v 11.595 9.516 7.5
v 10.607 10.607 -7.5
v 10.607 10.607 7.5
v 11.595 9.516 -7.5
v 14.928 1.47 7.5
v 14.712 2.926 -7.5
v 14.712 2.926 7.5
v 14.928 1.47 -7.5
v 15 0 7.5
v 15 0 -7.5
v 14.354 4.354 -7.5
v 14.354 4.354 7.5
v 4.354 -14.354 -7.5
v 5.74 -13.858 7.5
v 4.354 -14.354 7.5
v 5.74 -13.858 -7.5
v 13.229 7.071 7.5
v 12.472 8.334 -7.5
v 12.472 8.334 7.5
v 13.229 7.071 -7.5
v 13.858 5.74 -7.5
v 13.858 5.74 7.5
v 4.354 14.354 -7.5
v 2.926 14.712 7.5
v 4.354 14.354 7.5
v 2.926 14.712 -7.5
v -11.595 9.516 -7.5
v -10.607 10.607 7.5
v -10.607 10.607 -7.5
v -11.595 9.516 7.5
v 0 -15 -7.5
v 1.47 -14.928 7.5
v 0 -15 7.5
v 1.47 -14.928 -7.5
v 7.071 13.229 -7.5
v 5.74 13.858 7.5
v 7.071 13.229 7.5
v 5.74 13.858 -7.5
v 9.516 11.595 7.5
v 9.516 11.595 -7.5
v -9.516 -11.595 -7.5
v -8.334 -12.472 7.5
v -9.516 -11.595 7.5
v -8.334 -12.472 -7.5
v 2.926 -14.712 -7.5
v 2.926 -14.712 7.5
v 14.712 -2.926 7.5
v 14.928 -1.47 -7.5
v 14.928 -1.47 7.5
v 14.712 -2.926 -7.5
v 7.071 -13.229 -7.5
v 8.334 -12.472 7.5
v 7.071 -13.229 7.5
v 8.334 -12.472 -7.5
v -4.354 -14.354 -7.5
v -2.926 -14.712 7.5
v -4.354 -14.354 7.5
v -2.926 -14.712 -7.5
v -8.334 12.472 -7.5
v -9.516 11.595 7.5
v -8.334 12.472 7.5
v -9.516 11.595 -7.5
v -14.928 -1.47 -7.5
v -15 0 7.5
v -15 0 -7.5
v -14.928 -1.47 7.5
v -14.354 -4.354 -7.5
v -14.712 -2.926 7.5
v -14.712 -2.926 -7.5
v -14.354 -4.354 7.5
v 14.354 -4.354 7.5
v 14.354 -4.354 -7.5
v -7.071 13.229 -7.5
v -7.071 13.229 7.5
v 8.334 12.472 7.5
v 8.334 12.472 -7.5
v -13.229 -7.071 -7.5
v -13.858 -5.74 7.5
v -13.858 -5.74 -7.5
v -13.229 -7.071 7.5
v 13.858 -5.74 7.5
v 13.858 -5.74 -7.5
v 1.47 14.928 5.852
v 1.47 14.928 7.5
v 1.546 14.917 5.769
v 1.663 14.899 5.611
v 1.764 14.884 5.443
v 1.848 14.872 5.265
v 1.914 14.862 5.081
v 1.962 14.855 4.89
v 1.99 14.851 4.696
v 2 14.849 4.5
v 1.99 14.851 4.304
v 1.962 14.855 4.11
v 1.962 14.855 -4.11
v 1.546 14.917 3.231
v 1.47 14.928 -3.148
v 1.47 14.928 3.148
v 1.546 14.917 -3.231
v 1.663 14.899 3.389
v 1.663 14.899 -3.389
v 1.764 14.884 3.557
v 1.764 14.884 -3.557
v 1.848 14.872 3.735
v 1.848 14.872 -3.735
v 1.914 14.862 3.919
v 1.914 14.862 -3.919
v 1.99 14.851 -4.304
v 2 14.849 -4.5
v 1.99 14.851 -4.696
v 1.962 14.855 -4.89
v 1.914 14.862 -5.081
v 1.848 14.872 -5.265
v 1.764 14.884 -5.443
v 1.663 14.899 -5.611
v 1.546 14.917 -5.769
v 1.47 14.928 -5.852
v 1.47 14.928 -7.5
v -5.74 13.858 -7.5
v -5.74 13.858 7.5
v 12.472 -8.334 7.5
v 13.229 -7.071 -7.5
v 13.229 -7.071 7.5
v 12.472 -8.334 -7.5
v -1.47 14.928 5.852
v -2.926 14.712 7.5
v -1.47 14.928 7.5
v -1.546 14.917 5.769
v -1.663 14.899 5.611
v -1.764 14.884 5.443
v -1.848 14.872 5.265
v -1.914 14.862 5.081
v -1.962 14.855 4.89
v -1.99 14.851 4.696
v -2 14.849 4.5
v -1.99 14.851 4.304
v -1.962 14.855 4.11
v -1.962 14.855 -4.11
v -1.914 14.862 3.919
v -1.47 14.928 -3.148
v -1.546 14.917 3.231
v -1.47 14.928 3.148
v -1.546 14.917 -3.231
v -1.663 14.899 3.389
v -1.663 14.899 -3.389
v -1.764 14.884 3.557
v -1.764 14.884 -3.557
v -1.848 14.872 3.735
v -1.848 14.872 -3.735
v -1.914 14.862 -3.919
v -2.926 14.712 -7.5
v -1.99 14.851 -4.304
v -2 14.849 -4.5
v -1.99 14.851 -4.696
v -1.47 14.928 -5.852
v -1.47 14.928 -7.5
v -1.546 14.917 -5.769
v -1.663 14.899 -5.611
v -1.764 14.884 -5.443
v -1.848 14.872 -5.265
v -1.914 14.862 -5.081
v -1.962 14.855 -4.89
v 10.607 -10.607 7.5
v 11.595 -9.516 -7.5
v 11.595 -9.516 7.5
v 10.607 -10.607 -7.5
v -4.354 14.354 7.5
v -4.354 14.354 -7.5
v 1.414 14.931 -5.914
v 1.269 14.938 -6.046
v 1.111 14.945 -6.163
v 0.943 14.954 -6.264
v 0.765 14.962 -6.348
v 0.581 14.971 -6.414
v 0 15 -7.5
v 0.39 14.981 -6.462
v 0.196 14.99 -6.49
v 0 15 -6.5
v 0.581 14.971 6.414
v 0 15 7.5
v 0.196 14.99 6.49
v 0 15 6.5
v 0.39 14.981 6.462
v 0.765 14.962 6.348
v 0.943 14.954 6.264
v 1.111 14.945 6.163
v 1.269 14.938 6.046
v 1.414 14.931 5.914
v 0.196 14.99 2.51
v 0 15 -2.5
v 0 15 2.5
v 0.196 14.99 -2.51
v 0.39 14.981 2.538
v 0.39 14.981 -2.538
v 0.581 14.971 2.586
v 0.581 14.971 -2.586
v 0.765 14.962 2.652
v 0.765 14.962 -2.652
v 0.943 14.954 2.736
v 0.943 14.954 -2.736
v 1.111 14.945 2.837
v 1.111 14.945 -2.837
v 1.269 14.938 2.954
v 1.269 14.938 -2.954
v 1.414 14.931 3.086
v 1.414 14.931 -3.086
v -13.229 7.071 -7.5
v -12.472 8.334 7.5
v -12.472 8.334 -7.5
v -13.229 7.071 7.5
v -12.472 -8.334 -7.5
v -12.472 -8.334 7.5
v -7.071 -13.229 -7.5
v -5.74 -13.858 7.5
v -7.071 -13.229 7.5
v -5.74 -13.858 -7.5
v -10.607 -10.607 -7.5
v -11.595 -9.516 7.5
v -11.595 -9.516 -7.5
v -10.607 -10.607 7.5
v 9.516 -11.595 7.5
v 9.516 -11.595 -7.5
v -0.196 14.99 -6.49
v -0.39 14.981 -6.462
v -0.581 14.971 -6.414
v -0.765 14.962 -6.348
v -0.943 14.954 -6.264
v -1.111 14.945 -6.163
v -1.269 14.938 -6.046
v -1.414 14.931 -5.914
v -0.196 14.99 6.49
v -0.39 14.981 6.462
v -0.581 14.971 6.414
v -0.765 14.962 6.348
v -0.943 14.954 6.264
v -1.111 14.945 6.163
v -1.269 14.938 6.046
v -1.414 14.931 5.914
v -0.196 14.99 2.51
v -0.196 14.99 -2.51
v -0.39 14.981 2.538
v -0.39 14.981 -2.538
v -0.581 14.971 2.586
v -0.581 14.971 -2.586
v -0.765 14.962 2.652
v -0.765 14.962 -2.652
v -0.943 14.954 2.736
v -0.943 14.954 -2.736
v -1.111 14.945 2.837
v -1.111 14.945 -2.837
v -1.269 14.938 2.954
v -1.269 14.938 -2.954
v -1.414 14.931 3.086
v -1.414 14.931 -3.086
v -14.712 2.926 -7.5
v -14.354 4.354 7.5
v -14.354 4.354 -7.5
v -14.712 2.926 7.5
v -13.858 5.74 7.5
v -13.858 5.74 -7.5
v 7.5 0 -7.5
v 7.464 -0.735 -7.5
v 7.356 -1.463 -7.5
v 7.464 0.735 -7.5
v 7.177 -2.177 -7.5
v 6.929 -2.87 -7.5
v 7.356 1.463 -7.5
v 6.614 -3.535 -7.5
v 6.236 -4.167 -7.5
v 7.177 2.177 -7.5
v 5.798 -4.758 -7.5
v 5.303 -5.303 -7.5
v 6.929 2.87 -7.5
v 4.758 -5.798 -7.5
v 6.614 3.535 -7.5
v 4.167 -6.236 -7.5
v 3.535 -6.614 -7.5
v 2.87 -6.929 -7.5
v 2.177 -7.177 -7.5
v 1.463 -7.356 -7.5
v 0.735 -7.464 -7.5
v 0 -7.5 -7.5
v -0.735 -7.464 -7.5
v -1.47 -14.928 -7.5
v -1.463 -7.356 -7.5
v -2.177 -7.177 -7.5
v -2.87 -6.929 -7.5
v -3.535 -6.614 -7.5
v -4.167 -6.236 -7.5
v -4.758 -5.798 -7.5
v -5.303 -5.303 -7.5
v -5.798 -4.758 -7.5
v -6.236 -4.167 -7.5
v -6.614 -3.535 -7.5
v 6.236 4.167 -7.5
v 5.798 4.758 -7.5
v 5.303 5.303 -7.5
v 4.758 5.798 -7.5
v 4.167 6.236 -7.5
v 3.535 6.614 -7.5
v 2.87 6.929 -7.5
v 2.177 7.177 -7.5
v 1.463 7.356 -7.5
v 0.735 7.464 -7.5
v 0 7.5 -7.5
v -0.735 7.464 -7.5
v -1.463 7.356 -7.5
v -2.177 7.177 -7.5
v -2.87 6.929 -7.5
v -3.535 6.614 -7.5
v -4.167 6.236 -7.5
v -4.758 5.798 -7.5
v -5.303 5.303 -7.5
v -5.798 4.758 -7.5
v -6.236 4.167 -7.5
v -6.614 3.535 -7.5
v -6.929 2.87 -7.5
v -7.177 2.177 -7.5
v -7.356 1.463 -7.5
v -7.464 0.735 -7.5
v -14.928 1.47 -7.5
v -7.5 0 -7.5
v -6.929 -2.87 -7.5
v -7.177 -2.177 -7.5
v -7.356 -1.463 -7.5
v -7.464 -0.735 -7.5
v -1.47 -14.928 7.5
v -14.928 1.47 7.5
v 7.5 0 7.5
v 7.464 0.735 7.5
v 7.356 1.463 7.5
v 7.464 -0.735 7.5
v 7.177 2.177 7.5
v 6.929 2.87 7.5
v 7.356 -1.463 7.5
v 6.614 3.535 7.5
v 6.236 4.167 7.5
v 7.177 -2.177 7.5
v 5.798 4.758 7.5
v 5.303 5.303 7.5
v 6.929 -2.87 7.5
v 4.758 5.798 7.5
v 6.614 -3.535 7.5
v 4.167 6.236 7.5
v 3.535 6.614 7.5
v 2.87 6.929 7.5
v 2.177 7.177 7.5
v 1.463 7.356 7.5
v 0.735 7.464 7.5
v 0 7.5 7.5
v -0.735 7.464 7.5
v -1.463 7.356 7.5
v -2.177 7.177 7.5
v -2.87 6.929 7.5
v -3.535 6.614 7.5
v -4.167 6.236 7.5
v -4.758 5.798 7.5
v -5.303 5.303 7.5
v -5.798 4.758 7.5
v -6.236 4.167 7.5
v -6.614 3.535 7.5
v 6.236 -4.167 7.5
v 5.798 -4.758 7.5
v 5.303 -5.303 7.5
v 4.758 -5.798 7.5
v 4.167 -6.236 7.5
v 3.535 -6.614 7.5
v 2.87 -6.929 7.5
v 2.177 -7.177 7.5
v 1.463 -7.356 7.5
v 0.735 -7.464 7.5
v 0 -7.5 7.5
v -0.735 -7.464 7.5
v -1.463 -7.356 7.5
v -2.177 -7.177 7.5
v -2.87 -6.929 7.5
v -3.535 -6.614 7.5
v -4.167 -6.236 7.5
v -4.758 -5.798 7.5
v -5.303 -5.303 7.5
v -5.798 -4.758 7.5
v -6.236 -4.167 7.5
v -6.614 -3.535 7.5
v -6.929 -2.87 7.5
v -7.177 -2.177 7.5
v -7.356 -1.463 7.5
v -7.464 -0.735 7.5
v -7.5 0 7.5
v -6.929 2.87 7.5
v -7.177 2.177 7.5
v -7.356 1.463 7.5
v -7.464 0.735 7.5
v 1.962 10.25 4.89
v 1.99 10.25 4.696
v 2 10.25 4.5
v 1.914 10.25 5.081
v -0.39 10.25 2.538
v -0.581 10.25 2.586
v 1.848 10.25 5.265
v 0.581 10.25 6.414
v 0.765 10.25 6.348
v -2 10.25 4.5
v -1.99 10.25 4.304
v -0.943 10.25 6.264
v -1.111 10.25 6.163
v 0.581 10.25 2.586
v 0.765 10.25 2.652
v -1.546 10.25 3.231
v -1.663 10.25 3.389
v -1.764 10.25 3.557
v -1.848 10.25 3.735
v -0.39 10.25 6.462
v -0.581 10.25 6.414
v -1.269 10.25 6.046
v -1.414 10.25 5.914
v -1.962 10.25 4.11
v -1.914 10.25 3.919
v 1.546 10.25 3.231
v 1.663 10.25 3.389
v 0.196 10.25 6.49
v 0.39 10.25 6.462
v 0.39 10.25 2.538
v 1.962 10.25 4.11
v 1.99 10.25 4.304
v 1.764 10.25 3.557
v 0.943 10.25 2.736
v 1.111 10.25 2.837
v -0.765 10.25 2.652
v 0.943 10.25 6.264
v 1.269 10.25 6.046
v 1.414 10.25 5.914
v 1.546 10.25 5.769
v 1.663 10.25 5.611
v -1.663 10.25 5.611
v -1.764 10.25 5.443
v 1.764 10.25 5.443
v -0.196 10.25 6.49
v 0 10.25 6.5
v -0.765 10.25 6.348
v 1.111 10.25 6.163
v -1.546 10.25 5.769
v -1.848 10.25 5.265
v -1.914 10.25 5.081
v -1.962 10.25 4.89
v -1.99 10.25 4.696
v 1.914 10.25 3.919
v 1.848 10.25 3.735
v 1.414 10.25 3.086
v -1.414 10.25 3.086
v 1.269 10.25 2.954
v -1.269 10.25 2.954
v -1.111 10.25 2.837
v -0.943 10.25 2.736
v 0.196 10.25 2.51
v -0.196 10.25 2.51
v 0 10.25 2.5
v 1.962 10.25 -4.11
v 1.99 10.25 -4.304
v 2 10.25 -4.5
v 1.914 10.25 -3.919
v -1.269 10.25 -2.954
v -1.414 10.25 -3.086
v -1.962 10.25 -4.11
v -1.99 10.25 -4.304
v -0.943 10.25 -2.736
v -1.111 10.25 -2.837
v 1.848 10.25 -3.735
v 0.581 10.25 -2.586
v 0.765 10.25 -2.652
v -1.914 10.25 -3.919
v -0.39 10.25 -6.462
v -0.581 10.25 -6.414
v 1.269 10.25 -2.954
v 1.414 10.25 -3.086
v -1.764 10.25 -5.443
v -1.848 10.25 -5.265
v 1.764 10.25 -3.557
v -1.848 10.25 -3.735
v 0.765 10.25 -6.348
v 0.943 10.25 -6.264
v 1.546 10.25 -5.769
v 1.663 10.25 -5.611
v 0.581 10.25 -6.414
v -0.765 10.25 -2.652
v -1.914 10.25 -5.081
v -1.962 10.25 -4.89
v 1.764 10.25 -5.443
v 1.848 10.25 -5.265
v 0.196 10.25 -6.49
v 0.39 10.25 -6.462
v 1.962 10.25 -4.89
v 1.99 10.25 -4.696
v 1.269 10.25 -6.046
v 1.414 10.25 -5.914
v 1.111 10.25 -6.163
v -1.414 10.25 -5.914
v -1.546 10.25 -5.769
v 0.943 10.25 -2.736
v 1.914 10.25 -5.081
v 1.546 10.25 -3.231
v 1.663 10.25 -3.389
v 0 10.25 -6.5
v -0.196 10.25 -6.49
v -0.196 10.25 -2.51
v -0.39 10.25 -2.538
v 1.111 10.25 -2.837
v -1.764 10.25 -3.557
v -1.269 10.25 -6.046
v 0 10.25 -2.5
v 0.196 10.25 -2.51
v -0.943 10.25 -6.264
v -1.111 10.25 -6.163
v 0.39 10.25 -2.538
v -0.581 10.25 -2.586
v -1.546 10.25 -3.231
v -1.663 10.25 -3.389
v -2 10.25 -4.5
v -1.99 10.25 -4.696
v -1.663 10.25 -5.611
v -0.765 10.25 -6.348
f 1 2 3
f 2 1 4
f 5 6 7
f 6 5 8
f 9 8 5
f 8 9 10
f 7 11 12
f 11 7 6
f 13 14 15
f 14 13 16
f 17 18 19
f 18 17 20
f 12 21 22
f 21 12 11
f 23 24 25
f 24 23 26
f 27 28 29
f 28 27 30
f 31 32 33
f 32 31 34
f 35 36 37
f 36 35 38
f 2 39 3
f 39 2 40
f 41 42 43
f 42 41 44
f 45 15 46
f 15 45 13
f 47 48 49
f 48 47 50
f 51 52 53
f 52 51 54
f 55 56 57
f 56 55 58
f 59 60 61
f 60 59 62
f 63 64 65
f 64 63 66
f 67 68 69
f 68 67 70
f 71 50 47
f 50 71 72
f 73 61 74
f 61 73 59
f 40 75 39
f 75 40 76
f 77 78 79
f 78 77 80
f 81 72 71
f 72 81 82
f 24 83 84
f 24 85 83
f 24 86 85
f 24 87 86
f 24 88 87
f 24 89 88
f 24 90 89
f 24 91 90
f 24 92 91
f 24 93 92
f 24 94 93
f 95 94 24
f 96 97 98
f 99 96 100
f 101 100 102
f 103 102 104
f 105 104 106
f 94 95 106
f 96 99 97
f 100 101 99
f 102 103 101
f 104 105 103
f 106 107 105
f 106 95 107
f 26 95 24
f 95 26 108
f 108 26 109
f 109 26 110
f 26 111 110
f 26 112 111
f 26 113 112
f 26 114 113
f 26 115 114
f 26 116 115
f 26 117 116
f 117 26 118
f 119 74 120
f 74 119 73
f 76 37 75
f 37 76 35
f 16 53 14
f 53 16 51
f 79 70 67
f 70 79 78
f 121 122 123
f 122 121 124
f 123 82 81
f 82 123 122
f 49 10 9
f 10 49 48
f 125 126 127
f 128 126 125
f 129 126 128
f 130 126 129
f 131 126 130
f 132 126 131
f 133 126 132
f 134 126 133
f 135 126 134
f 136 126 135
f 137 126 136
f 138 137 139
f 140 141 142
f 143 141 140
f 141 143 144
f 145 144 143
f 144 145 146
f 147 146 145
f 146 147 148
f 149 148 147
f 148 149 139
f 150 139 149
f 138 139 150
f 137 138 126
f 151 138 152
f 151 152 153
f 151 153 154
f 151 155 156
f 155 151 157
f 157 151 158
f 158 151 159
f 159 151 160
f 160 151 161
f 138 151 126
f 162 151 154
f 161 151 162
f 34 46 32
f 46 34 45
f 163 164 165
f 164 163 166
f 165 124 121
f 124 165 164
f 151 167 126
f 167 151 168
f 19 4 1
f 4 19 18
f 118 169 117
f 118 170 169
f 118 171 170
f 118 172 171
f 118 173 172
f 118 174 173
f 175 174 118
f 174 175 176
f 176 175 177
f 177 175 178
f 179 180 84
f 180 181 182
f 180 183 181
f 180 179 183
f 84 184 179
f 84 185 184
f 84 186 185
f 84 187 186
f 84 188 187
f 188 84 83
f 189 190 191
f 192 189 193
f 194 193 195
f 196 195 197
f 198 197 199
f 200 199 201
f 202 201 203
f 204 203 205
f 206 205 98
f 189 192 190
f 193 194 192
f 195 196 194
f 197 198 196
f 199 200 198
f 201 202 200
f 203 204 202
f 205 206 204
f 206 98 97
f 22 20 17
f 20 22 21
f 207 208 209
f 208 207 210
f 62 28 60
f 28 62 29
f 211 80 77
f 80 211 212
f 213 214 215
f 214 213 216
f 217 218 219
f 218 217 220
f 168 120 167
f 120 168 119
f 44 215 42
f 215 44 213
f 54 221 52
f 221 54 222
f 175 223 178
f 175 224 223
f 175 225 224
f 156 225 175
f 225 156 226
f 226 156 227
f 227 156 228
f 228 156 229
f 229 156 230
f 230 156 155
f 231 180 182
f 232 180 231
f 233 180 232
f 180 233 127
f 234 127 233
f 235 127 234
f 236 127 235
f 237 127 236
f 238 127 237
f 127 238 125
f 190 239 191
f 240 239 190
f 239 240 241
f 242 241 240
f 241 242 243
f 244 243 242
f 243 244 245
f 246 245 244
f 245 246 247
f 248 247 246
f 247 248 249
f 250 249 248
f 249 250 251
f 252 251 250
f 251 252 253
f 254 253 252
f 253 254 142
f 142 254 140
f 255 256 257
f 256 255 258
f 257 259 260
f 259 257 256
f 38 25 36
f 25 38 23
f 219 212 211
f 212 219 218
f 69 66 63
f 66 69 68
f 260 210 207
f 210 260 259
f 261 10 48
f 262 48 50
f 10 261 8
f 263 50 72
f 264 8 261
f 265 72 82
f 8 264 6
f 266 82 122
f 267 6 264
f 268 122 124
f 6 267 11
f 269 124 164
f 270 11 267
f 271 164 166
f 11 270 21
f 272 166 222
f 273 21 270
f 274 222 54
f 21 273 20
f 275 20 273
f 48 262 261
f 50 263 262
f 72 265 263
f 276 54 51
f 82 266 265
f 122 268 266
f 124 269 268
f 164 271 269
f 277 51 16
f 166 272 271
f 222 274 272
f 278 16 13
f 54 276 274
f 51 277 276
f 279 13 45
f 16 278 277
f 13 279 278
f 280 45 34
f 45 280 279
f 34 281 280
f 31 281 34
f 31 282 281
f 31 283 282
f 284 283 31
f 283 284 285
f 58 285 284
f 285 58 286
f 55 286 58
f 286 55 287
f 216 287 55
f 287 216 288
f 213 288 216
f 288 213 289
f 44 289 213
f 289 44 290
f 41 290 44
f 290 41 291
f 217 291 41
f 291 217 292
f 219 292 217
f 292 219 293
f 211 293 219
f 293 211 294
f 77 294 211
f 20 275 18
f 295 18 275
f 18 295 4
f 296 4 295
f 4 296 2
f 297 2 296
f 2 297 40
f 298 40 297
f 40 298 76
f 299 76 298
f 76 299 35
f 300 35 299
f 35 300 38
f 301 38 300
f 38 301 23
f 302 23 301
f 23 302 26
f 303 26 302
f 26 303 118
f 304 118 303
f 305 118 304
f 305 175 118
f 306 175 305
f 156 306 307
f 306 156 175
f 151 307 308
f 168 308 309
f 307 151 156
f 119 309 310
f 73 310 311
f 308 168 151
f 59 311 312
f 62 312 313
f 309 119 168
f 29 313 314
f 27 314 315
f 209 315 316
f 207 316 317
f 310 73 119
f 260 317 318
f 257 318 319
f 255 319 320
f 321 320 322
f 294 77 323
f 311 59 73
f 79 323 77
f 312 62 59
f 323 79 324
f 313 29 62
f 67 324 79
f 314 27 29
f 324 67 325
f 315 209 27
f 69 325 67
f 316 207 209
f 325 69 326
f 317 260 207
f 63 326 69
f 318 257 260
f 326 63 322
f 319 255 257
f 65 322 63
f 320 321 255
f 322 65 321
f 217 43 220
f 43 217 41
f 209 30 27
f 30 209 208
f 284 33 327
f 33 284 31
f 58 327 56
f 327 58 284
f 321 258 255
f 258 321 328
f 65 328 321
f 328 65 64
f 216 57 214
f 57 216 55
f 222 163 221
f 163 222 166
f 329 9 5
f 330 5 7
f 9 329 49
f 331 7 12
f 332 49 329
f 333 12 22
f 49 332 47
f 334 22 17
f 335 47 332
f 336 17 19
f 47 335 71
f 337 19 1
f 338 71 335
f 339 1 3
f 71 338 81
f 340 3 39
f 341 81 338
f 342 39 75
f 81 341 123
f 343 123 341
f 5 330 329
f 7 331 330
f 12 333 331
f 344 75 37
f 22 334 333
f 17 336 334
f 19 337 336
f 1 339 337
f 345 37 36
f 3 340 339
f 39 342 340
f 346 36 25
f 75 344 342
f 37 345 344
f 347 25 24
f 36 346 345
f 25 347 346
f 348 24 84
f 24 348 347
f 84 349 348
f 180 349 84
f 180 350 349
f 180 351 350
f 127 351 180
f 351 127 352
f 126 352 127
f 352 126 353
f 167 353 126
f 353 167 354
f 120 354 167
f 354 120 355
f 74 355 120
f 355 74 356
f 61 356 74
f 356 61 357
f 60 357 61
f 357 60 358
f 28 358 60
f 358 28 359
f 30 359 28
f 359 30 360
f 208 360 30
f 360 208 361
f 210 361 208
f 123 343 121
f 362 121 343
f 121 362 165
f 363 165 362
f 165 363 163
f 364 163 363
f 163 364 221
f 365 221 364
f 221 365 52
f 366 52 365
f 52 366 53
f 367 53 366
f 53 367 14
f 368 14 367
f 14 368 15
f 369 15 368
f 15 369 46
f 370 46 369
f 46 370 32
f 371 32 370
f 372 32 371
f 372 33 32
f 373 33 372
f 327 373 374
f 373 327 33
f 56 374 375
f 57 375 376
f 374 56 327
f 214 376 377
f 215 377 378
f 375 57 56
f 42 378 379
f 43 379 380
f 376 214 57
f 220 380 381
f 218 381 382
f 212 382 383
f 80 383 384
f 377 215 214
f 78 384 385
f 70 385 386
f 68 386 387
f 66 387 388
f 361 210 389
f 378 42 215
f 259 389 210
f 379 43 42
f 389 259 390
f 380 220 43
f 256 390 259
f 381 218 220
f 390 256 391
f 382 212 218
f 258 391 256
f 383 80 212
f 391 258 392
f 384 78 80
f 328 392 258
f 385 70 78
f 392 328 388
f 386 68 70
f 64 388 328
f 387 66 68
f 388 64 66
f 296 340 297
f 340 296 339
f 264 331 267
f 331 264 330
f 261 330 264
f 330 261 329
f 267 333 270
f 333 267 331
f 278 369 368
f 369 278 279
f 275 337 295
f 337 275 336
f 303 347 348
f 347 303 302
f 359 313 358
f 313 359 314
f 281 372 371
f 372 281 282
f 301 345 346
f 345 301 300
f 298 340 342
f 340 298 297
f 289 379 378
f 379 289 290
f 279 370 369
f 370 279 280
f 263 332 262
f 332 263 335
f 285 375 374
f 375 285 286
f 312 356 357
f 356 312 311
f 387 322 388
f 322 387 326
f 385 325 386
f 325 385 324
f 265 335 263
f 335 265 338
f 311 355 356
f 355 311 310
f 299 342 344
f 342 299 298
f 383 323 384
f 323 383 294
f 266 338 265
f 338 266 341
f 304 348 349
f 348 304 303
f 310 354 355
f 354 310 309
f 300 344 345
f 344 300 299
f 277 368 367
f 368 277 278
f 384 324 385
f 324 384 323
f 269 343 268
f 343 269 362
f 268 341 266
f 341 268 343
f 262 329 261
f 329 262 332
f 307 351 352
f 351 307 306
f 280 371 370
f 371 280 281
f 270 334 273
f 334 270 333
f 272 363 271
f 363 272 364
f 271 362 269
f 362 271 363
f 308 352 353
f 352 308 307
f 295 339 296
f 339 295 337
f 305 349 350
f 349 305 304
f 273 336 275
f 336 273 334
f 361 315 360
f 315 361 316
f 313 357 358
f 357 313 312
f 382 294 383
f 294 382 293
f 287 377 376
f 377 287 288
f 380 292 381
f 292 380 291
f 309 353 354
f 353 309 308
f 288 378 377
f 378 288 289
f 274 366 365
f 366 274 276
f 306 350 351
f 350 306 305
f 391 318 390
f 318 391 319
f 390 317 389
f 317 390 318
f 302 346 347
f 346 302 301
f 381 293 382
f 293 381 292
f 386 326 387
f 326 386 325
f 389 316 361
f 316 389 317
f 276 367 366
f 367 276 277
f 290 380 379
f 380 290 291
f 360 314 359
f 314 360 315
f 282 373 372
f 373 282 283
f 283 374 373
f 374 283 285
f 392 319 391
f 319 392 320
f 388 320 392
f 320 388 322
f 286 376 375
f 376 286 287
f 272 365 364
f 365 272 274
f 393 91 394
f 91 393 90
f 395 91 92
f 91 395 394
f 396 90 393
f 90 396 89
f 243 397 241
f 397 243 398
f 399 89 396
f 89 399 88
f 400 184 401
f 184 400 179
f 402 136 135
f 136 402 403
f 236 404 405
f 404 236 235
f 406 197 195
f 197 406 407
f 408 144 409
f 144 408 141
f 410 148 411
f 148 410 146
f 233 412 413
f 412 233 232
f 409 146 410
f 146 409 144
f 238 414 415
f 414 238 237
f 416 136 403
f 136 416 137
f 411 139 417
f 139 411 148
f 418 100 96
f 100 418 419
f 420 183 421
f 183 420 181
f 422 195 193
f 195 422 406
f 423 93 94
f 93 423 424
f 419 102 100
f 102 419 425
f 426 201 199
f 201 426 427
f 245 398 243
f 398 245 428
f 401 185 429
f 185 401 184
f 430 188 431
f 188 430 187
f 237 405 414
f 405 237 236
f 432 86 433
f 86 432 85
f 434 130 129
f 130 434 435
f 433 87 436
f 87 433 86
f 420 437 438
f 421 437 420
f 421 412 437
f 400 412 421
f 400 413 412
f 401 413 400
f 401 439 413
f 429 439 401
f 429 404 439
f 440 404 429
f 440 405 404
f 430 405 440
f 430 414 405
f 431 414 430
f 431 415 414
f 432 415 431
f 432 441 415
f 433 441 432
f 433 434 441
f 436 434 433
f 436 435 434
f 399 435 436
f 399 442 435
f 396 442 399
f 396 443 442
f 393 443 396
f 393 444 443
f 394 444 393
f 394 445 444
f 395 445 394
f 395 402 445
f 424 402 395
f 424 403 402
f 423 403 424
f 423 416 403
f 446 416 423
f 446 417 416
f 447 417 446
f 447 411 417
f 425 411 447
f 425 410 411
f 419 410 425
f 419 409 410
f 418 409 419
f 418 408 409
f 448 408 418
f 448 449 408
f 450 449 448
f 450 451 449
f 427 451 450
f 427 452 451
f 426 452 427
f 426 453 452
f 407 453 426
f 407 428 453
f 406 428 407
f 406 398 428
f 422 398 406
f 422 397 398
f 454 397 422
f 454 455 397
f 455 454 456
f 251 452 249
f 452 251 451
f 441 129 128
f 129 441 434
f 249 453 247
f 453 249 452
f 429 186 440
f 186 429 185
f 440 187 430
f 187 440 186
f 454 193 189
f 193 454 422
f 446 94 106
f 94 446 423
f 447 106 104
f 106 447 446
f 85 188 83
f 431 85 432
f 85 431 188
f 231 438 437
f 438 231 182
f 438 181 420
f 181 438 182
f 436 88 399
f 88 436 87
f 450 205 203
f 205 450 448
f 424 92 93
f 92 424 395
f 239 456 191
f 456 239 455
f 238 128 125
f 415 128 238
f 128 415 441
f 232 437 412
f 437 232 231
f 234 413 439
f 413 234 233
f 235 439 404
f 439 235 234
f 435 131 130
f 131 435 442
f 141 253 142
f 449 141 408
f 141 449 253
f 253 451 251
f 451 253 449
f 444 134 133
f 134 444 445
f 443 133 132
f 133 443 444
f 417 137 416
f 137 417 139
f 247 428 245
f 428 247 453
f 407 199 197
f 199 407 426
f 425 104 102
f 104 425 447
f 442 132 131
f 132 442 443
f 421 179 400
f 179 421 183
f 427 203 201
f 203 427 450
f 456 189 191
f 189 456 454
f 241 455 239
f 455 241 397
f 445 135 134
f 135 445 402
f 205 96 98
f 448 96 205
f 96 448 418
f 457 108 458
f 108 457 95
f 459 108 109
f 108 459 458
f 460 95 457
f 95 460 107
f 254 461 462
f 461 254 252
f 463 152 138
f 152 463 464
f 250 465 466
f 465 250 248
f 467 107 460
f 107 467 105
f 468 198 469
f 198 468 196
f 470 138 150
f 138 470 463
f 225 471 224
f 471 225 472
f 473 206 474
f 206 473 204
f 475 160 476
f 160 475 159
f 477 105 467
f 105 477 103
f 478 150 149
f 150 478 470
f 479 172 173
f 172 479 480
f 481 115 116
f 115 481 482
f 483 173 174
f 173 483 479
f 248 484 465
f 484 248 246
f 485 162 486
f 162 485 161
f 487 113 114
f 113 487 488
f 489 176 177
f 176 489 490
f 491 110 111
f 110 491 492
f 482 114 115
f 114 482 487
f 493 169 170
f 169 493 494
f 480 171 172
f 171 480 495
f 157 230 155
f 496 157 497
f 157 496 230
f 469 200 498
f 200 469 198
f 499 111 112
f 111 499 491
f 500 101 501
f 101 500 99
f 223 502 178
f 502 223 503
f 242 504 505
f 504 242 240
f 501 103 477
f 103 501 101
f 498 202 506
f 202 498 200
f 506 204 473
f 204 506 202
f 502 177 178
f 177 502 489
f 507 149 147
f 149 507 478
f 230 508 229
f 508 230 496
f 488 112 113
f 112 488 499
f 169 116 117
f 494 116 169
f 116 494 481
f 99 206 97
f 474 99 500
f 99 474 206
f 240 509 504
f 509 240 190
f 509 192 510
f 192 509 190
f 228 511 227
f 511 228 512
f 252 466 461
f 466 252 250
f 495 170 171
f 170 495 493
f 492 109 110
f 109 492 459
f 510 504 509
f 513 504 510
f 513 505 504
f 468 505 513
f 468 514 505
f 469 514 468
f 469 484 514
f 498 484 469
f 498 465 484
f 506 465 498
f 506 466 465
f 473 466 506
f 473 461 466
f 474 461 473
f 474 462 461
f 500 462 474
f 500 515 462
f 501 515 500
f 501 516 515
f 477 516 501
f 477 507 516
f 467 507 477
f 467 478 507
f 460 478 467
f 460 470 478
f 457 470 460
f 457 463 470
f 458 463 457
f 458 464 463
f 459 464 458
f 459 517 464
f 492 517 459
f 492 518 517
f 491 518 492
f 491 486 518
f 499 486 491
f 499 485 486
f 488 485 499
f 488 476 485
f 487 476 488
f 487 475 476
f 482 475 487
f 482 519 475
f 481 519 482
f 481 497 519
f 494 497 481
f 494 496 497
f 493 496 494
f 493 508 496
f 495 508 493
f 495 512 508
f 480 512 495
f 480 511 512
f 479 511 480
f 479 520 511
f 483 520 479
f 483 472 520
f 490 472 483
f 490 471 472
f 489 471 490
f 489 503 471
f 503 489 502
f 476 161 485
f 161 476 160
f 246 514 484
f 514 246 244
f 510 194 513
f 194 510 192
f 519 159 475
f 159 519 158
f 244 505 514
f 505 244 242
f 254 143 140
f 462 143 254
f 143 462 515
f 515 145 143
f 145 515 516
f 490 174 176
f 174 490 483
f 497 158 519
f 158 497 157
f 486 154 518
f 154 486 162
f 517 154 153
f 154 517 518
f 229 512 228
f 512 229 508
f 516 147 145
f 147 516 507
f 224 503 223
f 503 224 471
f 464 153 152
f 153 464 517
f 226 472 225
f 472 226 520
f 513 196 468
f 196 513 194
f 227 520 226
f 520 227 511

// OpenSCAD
// COBRA Vertebra - C5 V4
// Height: 15.0mm, OD: 30.0mm

$fn = 64;

difference() {
    // Outer cylinder
    cylinder(h=15.0, d=30.0, center=true);
    
    // Inner channel
    cylinder(h=17.0, d=15.0, center=true);

    // Pivot holes
    translate([0, 15.0, 4.5])
    rotate([90, 0, 0])
    cylinder(h=9.5, d=4, center=true);
    
    translate([0, 15.0, -4.5])
    rotate([90, 0, 0])
    cylinder(h=9.5, d=4, center=true);
}
